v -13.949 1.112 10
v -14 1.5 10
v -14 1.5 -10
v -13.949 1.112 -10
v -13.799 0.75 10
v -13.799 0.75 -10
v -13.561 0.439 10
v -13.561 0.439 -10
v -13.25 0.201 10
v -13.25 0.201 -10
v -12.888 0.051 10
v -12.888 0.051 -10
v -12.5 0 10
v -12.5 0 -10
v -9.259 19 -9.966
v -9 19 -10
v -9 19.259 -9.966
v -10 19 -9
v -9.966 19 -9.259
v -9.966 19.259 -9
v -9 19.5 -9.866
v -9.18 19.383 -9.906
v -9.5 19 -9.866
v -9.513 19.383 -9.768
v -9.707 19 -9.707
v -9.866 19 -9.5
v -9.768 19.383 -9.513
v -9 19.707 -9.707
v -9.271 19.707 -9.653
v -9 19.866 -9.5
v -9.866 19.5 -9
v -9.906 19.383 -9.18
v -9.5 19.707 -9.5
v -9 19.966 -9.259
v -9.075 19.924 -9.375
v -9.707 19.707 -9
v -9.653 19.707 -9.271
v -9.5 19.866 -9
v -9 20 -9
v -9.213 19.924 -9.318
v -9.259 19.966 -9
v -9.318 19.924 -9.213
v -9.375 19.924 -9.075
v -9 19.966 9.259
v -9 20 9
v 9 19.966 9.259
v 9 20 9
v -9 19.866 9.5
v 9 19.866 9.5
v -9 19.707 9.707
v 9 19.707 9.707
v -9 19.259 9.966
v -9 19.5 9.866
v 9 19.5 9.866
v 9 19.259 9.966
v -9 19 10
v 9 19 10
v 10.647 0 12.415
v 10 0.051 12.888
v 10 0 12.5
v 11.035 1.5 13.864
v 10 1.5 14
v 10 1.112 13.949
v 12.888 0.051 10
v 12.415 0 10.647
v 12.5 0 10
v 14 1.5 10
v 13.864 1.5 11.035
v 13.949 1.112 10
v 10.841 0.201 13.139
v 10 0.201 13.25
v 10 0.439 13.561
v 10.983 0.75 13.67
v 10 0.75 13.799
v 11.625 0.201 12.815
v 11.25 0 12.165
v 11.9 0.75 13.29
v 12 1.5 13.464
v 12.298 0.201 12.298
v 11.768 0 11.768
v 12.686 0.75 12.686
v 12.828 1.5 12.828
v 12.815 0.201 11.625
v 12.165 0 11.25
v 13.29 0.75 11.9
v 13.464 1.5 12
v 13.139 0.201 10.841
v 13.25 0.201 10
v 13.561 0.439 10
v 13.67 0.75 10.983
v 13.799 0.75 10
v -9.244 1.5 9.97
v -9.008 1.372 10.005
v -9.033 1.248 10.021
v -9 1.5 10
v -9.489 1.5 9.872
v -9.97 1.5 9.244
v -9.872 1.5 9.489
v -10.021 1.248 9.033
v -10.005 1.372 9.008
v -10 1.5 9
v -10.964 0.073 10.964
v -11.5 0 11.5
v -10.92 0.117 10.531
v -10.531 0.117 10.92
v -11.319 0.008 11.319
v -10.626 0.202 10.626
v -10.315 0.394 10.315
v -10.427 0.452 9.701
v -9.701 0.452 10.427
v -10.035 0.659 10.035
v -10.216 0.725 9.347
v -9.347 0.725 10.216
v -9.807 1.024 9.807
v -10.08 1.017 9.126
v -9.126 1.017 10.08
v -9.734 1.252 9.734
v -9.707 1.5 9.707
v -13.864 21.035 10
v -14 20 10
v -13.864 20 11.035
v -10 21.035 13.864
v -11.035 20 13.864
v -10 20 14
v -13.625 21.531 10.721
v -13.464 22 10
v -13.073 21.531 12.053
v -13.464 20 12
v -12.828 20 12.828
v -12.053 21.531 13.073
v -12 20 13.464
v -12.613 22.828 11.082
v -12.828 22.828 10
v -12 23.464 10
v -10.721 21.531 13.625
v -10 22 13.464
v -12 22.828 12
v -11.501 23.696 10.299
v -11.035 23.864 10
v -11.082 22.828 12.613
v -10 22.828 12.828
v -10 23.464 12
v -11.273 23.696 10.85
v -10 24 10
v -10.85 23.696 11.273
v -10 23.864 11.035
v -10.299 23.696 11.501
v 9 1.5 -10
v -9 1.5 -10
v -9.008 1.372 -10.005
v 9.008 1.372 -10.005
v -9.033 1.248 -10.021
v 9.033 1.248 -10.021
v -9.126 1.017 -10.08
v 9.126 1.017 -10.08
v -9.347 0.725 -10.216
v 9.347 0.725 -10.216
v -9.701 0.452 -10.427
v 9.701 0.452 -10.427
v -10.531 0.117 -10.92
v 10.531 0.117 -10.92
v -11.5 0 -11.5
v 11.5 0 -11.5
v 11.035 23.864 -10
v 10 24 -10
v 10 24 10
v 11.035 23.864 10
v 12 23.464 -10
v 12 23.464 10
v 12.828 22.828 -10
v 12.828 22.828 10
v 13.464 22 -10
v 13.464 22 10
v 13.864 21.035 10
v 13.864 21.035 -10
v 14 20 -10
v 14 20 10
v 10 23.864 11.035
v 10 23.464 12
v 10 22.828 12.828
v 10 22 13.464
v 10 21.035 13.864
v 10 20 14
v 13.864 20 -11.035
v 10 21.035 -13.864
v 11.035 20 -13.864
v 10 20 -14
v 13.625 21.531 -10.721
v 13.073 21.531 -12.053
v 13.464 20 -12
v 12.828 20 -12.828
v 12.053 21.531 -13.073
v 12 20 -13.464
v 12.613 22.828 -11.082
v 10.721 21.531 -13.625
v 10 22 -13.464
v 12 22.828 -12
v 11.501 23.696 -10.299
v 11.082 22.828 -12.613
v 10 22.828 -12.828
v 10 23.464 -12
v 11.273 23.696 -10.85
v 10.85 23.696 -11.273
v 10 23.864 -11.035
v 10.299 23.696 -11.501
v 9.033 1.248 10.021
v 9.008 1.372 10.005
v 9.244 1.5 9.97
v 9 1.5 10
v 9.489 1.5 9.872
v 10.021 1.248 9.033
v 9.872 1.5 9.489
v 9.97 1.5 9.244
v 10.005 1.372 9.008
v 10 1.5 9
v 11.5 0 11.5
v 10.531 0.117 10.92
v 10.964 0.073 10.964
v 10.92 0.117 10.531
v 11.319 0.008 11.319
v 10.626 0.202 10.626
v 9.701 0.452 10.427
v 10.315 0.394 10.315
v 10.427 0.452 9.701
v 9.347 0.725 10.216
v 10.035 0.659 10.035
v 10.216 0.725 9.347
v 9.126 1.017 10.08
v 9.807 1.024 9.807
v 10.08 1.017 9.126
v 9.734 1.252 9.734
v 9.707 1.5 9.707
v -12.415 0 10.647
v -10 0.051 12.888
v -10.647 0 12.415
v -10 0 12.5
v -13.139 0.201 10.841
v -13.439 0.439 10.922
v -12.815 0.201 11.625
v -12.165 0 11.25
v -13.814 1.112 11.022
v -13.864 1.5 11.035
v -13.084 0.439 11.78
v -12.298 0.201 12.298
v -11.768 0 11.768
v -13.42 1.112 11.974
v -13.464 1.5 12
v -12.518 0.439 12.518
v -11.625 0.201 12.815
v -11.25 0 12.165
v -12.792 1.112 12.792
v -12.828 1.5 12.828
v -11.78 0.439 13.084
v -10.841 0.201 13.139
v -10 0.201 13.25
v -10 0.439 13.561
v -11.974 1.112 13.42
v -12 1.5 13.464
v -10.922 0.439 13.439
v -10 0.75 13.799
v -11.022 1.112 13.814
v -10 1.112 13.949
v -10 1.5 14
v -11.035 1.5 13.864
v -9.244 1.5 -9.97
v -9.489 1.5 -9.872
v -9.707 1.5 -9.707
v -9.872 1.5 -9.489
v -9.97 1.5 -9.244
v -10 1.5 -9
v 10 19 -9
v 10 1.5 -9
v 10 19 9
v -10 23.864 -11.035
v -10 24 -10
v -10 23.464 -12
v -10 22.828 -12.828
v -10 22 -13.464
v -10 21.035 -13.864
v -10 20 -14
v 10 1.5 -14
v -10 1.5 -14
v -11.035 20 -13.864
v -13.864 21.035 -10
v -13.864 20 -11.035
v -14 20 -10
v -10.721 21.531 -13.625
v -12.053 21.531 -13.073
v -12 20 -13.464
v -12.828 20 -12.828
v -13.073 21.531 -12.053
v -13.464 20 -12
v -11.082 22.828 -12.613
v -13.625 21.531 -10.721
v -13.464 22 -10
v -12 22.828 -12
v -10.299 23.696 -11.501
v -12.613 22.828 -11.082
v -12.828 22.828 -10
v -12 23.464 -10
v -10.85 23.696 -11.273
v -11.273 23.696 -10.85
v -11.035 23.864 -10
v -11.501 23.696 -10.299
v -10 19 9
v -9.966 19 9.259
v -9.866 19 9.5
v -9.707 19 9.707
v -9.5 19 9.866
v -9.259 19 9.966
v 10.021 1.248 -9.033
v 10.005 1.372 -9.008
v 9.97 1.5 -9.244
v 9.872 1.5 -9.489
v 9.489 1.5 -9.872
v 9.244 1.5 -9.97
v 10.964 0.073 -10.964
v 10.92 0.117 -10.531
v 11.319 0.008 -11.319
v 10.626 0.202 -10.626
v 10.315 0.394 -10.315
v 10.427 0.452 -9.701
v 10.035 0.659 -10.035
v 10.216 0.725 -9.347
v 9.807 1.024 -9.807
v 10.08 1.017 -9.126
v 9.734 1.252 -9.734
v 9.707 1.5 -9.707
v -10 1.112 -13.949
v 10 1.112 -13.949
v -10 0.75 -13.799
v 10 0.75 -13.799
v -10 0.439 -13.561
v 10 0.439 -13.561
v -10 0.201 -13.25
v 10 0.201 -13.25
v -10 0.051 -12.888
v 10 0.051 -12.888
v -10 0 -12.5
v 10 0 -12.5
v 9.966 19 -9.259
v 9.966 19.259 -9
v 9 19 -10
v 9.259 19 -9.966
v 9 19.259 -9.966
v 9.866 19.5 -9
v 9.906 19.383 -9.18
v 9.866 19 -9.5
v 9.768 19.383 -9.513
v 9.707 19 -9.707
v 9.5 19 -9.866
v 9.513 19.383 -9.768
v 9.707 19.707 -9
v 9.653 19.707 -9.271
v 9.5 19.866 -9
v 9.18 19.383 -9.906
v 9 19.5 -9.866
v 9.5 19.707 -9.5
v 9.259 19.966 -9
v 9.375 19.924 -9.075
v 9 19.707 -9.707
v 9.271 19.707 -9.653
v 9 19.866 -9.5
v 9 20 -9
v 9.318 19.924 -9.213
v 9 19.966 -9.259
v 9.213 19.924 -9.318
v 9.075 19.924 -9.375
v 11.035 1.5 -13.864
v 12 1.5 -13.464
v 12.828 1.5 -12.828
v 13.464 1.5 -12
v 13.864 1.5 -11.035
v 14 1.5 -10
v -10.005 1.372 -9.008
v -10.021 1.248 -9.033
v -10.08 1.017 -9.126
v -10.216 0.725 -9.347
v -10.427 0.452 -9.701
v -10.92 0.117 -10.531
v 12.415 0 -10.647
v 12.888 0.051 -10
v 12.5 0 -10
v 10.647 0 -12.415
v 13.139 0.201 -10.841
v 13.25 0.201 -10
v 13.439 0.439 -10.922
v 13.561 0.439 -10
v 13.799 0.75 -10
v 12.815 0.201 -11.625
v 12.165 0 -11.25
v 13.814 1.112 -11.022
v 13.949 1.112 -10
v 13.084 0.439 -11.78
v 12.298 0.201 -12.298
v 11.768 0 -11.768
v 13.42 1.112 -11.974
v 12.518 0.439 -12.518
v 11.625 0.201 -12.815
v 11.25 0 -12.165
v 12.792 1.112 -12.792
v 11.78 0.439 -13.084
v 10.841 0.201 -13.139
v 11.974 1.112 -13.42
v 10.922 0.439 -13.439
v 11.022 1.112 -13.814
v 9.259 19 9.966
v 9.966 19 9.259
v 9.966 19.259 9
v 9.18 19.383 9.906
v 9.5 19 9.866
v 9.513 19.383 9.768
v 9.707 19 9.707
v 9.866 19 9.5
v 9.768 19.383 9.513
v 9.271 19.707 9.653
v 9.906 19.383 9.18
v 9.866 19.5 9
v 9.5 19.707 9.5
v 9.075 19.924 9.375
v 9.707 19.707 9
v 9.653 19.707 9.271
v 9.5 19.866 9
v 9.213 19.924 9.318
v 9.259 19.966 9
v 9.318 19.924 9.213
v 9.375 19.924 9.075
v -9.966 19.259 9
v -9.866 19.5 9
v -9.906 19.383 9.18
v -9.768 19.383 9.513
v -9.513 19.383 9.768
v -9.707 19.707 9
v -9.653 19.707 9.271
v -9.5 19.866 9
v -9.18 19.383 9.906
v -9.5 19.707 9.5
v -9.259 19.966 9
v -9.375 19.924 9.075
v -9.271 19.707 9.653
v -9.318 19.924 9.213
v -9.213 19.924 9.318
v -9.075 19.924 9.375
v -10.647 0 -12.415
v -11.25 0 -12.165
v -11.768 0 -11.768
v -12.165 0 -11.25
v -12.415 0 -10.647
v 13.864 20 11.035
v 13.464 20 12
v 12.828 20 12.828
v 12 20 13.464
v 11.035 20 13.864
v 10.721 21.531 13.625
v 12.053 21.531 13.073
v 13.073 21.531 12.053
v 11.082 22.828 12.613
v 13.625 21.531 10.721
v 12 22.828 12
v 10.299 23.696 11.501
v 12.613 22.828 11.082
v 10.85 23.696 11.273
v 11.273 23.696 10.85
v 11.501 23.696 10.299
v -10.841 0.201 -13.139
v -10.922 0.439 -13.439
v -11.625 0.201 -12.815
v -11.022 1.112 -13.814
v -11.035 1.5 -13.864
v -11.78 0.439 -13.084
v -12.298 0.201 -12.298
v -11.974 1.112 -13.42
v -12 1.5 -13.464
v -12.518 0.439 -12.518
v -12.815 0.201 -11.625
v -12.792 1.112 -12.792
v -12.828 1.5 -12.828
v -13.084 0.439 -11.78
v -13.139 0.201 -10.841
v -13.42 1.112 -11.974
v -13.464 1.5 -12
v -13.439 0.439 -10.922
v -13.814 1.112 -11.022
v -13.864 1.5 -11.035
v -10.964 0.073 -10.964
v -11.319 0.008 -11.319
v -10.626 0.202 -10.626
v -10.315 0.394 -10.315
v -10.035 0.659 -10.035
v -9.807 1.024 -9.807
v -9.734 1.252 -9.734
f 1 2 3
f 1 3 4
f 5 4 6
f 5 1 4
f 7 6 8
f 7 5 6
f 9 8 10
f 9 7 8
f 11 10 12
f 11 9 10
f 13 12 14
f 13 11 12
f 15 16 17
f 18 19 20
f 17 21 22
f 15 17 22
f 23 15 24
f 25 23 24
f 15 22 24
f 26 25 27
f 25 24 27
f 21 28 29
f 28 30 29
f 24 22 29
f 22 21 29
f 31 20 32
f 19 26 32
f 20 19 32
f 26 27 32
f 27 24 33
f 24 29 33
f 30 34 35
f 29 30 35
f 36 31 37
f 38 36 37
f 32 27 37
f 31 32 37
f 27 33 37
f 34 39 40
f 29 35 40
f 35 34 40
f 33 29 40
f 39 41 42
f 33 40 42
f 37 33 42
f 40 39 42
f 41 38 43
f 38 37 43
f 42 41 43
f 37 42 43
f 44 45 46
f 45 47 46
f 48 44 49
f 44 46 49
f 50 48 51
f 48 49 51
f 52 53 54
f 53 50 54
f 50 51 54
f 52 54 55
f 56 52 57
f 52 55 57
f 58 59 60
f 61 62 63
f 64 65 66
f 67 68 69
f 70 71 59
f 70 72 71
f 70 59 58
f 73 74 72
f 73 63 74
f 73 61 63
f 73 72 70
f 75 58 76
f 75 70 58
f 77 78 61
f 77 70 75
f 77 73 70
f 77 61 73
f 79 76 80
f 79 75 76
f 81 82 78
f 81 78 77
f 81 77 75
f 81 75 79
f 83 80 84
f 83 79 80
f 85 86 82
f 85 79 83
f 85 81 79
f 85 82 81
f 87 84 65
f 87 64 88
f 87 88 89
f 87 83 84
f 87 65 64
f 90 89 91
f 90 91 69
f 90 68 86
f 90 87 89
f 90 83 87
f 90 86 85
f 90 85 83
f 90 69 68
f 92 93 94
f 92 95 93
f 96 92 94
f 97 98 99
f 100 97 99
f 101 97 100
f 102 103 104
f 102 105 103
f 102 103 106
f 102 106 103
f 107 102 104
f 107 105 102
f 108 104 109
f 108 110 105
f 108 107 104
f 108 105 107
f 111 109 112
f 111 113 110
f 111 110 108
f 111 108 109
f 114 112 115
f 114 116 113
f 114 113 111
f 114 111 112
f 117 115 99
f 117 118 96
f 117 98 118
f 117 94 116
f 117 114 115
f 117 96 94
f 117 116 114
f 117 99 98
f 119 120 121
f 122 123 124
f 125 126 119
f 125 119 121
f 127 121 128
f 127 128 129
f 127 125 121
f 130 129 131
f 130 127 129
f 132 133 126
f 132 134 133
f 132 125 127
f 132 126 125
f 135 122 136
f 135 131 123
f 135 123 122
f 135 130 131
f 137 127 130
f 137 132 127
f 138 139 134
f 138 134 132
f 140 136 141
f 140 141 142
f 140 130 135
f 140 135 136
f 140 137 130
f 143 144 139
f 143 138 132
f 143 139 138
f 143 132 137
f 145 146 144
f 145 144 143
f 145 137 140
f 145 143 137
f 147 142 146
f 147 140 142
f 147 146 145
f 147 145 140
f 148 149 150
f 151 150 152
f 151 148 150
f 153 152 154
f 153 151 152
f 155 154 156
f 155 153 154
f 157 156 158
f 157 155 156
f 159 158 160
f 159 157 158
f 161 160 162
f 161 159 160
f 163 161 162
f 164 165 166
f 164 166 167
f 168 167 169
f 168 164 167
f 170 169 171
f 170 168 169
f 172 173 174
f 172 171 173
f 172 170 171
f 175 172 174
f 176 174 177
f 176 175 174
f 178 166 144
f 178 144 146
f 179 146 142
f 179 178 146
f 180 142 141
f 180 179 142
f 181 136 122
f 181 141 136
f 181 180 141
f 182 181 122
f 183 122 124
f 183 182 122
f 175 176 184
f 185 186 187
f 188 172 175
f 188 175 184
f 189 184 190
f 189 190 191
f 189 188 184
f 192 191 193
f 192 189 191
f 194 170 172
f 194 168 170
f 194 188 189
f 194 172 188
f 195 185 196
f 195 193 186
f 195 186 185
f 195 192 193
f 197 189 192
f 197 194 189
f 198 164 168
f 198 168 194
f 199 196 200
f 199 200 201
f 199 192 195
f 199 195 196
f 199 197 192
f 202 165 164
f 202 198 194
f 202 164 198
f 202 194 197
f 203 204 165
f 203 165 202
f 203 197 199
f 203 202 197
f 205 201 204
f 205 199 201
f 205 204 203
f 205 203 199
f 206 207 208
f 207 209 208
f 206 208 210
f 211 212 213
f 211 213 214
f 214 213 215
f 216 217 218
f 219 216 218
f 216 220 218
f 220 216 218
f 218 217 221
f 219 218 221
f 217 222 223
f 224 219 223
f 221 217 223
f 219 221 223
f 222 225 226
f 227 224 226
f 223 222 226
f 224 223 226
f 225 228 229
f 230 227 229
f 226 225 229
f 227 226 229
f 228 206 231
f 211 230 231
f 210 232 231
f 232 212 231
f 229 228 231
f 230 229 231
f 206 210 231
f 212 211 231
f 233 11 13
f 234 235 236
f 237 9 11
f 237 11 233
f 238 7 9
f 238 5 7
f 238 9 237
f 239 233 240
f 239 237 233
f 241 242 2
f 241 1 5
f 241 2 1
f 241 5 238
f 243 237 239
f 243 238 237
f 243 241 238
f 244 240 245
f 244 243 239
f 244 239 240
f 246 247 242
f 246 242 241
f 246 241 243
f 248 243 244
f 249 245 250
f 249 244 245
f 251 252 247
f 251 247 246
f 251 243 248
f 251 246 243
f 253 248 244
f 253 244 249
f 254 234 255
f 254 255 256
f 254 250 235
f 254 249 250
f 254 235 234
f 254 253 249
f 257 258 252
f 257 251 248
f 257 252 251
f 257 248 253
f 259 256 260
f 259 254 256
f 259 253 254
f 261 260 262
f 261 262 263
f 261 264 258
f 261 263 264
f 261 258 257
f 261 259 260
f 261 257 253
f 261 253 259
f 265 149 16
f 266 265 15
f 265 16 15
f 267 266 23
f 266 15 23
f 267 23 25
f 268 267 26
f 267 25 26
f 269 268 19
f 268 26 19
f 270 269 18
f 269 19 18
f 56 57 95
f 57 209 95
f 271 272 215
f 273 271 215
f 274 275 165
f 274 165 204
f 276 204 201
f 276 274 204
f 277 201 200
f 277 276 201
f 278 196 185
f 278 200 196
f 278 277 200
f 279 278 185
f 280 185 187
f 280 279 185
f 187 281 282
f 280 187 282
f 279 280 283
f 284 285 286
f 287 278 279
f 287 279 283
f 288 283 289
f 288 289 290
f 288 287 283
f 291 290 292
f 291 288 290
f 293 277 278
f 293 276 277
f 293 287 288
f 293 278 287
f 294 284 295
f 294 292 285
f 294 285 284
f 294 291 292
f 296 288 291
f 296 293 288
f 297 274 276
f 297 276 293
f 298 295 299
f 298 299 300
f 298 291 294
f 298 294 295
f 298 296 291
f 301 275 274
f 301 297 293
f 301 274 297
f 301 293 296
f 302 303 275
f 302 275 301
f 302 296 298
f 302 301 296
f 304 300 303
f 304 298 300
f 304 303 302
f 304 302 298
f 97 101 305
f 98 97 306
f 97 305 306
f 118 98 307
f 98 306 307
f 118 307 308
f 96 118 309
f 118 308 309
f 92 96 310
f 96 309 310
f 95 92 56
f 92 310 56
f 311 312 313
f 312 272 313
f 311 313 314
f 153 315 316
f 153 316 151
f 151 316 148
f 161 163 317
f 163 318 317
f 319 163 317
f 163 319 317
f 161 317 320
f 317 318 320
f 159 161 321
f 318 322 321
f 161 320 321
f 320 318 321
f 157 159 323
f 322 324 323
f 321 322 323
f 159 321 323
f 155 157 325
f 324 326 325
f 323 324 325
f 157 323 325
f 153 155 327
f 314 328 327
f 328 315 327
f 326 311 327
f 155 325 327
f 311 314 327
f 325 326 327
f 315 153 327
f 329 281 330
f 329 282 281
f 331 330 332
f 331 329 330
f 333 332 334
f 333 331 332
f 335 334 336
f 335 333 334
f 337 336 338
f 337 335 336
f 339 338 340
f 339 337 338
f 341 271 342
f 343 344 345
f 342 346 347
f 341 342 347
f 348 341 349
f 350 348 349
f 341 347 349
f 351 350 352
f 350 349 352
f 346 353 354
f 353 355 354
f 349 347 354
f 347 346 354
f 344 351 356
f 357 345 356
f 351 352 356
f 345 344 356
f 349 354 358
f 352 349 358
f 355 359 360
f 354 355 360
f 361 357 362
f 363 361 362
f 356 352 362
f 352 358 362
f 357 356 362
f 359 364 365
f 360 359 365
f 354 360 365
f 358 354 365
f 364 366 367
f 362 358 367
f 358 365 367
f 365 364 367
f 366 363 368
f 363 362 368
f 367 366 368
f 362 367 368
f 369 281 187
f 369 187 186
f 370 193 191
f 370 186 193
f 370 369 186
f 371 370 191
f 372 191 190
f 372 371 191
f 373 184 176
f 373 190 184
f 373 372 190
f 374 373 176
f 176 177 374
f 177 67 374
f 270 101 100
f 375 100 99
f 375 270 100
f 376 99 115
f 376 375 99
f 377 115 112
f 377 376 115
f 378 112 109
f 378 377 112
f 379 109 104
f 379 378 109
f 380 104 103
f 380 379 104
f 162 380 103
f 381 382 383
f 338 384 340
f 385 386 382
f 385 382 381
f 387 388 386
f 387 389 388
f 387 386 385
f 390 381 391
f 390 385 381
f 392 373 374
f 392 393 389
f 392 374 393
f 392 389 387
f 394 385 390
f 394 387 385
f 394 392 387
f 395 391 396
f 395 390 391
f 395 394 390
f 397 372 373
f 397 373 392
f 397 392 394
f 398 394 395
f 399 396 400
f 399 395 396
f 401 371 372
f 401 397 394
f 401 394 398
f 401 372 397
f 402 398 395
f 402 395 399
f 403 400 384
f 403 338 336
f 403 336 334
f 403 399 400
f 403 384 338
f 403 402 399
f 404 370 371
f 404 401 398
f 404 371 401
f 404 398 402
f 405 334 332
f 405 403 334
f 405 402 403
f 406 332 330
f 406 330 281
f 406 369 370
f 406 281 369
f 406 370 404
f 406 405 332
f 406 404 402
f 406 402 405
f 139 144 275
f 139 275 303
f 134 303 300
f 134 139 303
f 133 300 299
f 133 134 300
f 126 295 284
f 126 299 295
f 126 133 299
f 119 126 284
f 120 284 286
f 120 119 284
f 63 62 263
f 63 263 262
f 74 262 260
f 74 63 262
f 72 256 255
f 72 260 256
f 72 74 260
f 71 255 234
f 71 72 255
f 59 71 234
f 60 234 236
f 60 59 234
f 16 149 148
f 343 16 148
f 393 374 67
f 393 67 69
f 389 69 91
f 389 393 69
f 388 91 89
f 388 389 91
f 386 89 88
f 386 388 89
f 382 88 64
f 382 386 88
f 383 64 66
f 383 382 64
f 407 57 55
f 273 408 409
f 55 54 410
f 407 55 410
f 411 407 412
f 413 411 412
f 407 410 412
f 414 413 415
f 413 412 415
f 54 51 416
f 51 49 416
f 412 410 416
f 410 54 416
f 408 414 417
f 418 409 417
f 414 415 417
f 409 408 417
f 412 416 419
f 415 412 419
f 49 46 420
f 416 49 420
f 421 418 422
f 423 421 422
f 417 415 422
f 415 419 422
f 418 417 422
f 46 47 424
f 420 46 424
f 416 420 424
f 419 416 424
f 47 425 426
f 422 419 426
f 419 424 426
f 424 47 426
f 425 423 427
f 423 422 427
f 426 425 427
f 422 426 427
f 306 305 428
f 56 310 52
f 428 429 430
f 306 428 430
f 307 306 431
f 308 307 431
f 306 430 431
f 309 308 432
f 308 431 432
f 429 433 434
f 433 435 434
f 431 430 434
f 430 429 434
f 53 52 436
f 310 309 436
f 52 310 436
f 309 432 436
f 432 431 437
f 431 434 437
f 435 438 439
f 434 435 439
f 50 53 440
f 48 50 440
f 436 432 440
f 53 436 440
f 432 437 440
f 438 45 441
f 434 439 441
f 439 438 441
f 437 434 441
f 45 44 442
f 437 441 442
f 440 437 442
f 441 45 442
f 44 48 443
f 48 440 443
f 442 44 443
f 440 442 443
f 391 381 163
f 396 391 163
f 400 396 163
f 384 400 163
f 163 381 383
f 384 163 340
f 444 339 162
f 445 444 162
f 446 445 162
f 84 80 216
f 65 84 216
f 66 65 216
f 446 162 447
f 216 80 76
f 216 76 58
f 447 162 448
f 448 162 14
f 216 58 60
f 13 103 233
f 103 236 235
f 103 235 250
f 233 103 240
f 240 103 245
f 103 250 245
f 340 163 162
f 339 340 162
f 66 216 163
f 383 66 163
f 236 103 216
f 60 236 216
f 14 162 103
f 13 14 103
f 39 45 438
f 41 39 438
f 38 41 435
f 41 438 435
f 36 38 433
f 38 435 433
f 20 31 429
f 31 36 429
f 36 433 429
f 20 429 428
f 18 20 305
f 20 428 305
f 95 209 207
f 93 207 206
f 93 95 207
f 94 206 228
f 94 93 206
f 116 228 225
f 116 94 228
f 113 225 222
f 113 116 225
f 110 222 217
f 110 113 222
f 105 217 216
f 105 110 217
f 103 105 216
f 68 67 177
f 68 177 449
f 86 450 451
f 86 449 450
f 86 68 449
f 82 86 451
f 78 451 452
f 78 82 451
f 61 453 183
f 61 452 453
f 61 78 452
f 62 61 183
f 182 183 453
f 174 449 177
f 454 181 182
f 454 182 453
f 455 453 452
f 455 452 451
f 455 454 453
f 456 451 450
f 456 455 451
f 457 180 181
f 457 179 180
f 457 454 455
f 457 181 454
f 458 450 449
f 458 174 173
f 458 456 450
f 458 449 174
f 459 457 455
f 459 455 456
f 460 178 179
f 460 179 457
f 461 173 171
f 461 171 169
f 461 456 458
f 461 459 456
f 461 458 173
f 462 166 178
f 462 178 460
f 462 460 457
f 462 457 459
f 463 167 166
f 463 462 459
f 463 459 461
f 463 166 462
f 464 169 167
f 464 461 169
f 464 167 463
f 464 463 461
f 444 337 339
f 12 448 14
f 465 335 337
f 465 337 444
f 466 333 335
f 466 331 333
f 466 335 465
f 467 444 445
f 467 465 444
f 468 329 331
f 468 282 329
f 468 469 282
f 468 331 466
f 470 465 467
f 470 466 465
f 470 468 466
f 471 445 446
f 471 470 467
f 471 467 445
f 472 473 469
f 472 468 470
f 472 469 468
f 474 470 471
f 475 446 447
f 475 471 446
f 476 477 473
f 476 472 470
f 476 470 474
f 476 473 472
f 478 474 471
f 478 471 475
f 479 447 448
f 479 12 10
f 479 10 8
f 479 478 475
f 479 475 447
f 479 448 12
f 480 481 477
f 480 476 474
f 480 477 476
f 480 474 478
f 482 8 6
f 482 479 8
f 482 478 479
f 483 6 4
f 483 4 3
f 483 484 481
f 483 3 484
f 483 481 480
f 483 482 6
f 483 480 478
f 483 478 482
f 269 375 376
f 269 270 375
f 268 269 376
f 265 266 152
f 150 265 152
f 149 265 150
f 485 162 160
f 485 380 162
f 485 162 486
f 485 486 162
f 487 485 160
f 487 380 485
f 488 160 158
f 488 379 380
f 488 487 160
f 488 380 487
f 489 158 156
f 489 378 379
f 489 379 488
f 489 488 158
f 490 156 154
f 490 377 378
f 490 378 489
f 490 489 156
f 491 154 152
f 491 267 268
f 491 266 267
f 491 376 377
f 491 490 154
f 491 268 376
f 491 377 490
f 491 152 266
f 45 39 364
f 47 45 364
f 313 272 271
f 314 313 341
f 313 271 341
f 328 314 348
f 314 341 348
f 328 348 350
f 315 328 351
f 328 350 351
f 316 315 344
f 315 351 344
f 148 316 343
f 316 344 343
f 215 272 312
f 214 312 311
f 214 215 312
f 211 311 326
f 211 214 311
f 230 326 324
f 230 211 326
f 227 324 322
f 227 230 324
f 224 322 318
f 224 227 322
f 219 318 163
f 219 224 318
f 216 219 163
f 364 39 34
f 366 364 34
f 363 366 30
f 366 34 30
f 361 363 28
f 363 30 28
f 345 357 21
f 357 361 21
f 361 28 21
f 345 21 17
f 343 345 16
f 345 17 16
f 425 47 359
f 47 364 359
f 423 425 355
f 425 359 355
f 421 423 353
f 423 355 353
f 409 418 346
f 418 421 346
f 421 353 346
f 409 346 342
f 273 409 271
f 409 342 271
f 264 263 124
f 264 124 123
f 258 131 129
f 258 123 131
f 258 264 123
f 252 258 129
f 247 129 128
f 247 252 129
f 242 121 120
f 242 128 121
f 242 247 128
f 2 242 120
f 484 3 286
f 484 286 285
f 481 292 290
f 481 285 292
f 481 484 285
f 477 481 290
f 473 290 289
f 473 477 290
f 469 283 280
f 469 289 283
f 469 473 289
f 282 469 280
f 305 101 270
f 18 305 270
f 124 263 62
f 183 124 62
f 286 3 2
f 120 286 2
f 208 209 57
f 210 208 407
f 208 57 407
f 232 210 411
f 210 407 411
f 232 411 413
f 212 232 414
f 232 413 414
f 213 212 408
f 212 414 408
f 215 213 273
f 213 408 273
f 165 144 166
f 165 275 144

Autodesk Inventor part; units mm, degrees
ref_plane "YZ Plane" through (0, 0, 0) normal (1, 0, 0) x (0, 1, 0)
ref_plane "XZ Plane" through (0, 0, 0) normal (0, 1, 0) x (-1, 0, 0)
ref_plane "XY Plane" through (0, 0, 0) normal (0, 0, 1) x (1, 0, 0)
sketch "Sketch1" plane through (0, 0, 0) normal (0, 1, 0) x (-1, 0, 0)
  line L0 (-10, 10) -> (10, 10)
  line L1 (10, 10) -> (10, -10)
  line L2 (10, -10) -> (-10, -10)
  line L3 (-10, -10) -> (-10, 10)
  line L4 (-10, 10) -> (10, -10) construction
  line L5 (10, 10) -> (-10, -10) construction
  line L6 (14, -10) -> (14, 10)
  line L7 (10, 14) -> (-10, 14)
  line L8 (-14, 10) -> (-14, -10)
  line L9 (-10, -14) -> (10, -14)
  arc A0 (10, -14) -> (14, -10) centre (10, -10) ccw
  arc A1 (-14, -10) -> (-10, -14) centre (-10, -10) ccw
  arc A2 (-10, 14) -> (-14, 10) centre (-10, 10) ccw
  arc A3 (14, 10) -> (10, 14) centre (10, 10) ccw
  point P0 (0, 0)
  point P1 (14, -14)
  point P2 (14, 14)
  point P3 (-14, 14)
  point P4 (-14, -14)
  dimension "d0" = 20
  dimension "d1" = 4
  dimension "d6" = 4
extrude "Extrusion1" add sketch "Sketch1" along normal blind 20
sketch "Sketch2" plane through (0, 20, 0) normal (0, 1, 0) x (1, 0, 0)
  line L0 (-10, -14) -> (10, -14) projected
  line L1 (-14, 10) -> (-14, -10) projected
  line L2 (10, 14) -> (-10, 14) projected
  line L3 (14, -10) -> (14, 10) projected
  arc A0 (-10, 14) -> (-14, 10) centre (-10, 10) ccw projected
  arc A1 (-14, -10) -> (-10, -14) centre (-10, -10) ccw projected
  arc A2 (10, -14) -> (14, -10) centre (10, -10) ccw projected
  arc A3 (14, 10) -> (10, 14) centre (10, 10) ccw projected
  point P0 (0, 0)
  point P1 (-13, -13)
  point P2 (13, -13)
  point P3 (-13, 13)
  point P4 (13, 13)
extrude "Extrusion2" add sketch "Sketch2" along normal blind 4
fillet "Fillet1" radius 4 8 edges at (12.8284, 24, 12.8284) (14, 24, 0) (12.8284, 24, -12.8284) (0, 24, -14) (-12.8284, 24, -12.8284) (-14, 24, 0) (-12.8284, 24, 12.8284) (0, 24, 14)
fillet "Fillet2" radius 1.5 12 edges at (12.8284, 0, 12.8284) (14, 0, 0) (12.8284, 0, -12.8284) (0, 0, -14) (-12.8284, 0, -12.8284) (-14, 0, 0) (-12.8284, 0, 12.8284) (0, 0, 14) (0, 0, 10) (10, 0, 0) (0, 0, -10) (-10, 0, 0)
fillet "Fillet3" radius 1 8 edges at (10, 10.75, 10) (10.4393, 0.4393, 10.4393) (10, 10.75, -10) (10.4393, 0.4393, -10.4393) (-10, 10.75, -10) (-10.4393, 0.4393, -10.4393) (-10, 10.75, 10) (-10.4393, 0.4393, 10.4393)
fillet "Fillet4" radius 1 8 edges at (9.7071, 20, 9.7071) (0, 20, 10) (-9.7071, 20, 9.7071) (-10, 20, 0) (-9.7071, 20, -9.7071) (0, 20, -10) (9.7071, 20, -9.7071) (10, 20, 0)
properties part number "Cap_3DPrint"
